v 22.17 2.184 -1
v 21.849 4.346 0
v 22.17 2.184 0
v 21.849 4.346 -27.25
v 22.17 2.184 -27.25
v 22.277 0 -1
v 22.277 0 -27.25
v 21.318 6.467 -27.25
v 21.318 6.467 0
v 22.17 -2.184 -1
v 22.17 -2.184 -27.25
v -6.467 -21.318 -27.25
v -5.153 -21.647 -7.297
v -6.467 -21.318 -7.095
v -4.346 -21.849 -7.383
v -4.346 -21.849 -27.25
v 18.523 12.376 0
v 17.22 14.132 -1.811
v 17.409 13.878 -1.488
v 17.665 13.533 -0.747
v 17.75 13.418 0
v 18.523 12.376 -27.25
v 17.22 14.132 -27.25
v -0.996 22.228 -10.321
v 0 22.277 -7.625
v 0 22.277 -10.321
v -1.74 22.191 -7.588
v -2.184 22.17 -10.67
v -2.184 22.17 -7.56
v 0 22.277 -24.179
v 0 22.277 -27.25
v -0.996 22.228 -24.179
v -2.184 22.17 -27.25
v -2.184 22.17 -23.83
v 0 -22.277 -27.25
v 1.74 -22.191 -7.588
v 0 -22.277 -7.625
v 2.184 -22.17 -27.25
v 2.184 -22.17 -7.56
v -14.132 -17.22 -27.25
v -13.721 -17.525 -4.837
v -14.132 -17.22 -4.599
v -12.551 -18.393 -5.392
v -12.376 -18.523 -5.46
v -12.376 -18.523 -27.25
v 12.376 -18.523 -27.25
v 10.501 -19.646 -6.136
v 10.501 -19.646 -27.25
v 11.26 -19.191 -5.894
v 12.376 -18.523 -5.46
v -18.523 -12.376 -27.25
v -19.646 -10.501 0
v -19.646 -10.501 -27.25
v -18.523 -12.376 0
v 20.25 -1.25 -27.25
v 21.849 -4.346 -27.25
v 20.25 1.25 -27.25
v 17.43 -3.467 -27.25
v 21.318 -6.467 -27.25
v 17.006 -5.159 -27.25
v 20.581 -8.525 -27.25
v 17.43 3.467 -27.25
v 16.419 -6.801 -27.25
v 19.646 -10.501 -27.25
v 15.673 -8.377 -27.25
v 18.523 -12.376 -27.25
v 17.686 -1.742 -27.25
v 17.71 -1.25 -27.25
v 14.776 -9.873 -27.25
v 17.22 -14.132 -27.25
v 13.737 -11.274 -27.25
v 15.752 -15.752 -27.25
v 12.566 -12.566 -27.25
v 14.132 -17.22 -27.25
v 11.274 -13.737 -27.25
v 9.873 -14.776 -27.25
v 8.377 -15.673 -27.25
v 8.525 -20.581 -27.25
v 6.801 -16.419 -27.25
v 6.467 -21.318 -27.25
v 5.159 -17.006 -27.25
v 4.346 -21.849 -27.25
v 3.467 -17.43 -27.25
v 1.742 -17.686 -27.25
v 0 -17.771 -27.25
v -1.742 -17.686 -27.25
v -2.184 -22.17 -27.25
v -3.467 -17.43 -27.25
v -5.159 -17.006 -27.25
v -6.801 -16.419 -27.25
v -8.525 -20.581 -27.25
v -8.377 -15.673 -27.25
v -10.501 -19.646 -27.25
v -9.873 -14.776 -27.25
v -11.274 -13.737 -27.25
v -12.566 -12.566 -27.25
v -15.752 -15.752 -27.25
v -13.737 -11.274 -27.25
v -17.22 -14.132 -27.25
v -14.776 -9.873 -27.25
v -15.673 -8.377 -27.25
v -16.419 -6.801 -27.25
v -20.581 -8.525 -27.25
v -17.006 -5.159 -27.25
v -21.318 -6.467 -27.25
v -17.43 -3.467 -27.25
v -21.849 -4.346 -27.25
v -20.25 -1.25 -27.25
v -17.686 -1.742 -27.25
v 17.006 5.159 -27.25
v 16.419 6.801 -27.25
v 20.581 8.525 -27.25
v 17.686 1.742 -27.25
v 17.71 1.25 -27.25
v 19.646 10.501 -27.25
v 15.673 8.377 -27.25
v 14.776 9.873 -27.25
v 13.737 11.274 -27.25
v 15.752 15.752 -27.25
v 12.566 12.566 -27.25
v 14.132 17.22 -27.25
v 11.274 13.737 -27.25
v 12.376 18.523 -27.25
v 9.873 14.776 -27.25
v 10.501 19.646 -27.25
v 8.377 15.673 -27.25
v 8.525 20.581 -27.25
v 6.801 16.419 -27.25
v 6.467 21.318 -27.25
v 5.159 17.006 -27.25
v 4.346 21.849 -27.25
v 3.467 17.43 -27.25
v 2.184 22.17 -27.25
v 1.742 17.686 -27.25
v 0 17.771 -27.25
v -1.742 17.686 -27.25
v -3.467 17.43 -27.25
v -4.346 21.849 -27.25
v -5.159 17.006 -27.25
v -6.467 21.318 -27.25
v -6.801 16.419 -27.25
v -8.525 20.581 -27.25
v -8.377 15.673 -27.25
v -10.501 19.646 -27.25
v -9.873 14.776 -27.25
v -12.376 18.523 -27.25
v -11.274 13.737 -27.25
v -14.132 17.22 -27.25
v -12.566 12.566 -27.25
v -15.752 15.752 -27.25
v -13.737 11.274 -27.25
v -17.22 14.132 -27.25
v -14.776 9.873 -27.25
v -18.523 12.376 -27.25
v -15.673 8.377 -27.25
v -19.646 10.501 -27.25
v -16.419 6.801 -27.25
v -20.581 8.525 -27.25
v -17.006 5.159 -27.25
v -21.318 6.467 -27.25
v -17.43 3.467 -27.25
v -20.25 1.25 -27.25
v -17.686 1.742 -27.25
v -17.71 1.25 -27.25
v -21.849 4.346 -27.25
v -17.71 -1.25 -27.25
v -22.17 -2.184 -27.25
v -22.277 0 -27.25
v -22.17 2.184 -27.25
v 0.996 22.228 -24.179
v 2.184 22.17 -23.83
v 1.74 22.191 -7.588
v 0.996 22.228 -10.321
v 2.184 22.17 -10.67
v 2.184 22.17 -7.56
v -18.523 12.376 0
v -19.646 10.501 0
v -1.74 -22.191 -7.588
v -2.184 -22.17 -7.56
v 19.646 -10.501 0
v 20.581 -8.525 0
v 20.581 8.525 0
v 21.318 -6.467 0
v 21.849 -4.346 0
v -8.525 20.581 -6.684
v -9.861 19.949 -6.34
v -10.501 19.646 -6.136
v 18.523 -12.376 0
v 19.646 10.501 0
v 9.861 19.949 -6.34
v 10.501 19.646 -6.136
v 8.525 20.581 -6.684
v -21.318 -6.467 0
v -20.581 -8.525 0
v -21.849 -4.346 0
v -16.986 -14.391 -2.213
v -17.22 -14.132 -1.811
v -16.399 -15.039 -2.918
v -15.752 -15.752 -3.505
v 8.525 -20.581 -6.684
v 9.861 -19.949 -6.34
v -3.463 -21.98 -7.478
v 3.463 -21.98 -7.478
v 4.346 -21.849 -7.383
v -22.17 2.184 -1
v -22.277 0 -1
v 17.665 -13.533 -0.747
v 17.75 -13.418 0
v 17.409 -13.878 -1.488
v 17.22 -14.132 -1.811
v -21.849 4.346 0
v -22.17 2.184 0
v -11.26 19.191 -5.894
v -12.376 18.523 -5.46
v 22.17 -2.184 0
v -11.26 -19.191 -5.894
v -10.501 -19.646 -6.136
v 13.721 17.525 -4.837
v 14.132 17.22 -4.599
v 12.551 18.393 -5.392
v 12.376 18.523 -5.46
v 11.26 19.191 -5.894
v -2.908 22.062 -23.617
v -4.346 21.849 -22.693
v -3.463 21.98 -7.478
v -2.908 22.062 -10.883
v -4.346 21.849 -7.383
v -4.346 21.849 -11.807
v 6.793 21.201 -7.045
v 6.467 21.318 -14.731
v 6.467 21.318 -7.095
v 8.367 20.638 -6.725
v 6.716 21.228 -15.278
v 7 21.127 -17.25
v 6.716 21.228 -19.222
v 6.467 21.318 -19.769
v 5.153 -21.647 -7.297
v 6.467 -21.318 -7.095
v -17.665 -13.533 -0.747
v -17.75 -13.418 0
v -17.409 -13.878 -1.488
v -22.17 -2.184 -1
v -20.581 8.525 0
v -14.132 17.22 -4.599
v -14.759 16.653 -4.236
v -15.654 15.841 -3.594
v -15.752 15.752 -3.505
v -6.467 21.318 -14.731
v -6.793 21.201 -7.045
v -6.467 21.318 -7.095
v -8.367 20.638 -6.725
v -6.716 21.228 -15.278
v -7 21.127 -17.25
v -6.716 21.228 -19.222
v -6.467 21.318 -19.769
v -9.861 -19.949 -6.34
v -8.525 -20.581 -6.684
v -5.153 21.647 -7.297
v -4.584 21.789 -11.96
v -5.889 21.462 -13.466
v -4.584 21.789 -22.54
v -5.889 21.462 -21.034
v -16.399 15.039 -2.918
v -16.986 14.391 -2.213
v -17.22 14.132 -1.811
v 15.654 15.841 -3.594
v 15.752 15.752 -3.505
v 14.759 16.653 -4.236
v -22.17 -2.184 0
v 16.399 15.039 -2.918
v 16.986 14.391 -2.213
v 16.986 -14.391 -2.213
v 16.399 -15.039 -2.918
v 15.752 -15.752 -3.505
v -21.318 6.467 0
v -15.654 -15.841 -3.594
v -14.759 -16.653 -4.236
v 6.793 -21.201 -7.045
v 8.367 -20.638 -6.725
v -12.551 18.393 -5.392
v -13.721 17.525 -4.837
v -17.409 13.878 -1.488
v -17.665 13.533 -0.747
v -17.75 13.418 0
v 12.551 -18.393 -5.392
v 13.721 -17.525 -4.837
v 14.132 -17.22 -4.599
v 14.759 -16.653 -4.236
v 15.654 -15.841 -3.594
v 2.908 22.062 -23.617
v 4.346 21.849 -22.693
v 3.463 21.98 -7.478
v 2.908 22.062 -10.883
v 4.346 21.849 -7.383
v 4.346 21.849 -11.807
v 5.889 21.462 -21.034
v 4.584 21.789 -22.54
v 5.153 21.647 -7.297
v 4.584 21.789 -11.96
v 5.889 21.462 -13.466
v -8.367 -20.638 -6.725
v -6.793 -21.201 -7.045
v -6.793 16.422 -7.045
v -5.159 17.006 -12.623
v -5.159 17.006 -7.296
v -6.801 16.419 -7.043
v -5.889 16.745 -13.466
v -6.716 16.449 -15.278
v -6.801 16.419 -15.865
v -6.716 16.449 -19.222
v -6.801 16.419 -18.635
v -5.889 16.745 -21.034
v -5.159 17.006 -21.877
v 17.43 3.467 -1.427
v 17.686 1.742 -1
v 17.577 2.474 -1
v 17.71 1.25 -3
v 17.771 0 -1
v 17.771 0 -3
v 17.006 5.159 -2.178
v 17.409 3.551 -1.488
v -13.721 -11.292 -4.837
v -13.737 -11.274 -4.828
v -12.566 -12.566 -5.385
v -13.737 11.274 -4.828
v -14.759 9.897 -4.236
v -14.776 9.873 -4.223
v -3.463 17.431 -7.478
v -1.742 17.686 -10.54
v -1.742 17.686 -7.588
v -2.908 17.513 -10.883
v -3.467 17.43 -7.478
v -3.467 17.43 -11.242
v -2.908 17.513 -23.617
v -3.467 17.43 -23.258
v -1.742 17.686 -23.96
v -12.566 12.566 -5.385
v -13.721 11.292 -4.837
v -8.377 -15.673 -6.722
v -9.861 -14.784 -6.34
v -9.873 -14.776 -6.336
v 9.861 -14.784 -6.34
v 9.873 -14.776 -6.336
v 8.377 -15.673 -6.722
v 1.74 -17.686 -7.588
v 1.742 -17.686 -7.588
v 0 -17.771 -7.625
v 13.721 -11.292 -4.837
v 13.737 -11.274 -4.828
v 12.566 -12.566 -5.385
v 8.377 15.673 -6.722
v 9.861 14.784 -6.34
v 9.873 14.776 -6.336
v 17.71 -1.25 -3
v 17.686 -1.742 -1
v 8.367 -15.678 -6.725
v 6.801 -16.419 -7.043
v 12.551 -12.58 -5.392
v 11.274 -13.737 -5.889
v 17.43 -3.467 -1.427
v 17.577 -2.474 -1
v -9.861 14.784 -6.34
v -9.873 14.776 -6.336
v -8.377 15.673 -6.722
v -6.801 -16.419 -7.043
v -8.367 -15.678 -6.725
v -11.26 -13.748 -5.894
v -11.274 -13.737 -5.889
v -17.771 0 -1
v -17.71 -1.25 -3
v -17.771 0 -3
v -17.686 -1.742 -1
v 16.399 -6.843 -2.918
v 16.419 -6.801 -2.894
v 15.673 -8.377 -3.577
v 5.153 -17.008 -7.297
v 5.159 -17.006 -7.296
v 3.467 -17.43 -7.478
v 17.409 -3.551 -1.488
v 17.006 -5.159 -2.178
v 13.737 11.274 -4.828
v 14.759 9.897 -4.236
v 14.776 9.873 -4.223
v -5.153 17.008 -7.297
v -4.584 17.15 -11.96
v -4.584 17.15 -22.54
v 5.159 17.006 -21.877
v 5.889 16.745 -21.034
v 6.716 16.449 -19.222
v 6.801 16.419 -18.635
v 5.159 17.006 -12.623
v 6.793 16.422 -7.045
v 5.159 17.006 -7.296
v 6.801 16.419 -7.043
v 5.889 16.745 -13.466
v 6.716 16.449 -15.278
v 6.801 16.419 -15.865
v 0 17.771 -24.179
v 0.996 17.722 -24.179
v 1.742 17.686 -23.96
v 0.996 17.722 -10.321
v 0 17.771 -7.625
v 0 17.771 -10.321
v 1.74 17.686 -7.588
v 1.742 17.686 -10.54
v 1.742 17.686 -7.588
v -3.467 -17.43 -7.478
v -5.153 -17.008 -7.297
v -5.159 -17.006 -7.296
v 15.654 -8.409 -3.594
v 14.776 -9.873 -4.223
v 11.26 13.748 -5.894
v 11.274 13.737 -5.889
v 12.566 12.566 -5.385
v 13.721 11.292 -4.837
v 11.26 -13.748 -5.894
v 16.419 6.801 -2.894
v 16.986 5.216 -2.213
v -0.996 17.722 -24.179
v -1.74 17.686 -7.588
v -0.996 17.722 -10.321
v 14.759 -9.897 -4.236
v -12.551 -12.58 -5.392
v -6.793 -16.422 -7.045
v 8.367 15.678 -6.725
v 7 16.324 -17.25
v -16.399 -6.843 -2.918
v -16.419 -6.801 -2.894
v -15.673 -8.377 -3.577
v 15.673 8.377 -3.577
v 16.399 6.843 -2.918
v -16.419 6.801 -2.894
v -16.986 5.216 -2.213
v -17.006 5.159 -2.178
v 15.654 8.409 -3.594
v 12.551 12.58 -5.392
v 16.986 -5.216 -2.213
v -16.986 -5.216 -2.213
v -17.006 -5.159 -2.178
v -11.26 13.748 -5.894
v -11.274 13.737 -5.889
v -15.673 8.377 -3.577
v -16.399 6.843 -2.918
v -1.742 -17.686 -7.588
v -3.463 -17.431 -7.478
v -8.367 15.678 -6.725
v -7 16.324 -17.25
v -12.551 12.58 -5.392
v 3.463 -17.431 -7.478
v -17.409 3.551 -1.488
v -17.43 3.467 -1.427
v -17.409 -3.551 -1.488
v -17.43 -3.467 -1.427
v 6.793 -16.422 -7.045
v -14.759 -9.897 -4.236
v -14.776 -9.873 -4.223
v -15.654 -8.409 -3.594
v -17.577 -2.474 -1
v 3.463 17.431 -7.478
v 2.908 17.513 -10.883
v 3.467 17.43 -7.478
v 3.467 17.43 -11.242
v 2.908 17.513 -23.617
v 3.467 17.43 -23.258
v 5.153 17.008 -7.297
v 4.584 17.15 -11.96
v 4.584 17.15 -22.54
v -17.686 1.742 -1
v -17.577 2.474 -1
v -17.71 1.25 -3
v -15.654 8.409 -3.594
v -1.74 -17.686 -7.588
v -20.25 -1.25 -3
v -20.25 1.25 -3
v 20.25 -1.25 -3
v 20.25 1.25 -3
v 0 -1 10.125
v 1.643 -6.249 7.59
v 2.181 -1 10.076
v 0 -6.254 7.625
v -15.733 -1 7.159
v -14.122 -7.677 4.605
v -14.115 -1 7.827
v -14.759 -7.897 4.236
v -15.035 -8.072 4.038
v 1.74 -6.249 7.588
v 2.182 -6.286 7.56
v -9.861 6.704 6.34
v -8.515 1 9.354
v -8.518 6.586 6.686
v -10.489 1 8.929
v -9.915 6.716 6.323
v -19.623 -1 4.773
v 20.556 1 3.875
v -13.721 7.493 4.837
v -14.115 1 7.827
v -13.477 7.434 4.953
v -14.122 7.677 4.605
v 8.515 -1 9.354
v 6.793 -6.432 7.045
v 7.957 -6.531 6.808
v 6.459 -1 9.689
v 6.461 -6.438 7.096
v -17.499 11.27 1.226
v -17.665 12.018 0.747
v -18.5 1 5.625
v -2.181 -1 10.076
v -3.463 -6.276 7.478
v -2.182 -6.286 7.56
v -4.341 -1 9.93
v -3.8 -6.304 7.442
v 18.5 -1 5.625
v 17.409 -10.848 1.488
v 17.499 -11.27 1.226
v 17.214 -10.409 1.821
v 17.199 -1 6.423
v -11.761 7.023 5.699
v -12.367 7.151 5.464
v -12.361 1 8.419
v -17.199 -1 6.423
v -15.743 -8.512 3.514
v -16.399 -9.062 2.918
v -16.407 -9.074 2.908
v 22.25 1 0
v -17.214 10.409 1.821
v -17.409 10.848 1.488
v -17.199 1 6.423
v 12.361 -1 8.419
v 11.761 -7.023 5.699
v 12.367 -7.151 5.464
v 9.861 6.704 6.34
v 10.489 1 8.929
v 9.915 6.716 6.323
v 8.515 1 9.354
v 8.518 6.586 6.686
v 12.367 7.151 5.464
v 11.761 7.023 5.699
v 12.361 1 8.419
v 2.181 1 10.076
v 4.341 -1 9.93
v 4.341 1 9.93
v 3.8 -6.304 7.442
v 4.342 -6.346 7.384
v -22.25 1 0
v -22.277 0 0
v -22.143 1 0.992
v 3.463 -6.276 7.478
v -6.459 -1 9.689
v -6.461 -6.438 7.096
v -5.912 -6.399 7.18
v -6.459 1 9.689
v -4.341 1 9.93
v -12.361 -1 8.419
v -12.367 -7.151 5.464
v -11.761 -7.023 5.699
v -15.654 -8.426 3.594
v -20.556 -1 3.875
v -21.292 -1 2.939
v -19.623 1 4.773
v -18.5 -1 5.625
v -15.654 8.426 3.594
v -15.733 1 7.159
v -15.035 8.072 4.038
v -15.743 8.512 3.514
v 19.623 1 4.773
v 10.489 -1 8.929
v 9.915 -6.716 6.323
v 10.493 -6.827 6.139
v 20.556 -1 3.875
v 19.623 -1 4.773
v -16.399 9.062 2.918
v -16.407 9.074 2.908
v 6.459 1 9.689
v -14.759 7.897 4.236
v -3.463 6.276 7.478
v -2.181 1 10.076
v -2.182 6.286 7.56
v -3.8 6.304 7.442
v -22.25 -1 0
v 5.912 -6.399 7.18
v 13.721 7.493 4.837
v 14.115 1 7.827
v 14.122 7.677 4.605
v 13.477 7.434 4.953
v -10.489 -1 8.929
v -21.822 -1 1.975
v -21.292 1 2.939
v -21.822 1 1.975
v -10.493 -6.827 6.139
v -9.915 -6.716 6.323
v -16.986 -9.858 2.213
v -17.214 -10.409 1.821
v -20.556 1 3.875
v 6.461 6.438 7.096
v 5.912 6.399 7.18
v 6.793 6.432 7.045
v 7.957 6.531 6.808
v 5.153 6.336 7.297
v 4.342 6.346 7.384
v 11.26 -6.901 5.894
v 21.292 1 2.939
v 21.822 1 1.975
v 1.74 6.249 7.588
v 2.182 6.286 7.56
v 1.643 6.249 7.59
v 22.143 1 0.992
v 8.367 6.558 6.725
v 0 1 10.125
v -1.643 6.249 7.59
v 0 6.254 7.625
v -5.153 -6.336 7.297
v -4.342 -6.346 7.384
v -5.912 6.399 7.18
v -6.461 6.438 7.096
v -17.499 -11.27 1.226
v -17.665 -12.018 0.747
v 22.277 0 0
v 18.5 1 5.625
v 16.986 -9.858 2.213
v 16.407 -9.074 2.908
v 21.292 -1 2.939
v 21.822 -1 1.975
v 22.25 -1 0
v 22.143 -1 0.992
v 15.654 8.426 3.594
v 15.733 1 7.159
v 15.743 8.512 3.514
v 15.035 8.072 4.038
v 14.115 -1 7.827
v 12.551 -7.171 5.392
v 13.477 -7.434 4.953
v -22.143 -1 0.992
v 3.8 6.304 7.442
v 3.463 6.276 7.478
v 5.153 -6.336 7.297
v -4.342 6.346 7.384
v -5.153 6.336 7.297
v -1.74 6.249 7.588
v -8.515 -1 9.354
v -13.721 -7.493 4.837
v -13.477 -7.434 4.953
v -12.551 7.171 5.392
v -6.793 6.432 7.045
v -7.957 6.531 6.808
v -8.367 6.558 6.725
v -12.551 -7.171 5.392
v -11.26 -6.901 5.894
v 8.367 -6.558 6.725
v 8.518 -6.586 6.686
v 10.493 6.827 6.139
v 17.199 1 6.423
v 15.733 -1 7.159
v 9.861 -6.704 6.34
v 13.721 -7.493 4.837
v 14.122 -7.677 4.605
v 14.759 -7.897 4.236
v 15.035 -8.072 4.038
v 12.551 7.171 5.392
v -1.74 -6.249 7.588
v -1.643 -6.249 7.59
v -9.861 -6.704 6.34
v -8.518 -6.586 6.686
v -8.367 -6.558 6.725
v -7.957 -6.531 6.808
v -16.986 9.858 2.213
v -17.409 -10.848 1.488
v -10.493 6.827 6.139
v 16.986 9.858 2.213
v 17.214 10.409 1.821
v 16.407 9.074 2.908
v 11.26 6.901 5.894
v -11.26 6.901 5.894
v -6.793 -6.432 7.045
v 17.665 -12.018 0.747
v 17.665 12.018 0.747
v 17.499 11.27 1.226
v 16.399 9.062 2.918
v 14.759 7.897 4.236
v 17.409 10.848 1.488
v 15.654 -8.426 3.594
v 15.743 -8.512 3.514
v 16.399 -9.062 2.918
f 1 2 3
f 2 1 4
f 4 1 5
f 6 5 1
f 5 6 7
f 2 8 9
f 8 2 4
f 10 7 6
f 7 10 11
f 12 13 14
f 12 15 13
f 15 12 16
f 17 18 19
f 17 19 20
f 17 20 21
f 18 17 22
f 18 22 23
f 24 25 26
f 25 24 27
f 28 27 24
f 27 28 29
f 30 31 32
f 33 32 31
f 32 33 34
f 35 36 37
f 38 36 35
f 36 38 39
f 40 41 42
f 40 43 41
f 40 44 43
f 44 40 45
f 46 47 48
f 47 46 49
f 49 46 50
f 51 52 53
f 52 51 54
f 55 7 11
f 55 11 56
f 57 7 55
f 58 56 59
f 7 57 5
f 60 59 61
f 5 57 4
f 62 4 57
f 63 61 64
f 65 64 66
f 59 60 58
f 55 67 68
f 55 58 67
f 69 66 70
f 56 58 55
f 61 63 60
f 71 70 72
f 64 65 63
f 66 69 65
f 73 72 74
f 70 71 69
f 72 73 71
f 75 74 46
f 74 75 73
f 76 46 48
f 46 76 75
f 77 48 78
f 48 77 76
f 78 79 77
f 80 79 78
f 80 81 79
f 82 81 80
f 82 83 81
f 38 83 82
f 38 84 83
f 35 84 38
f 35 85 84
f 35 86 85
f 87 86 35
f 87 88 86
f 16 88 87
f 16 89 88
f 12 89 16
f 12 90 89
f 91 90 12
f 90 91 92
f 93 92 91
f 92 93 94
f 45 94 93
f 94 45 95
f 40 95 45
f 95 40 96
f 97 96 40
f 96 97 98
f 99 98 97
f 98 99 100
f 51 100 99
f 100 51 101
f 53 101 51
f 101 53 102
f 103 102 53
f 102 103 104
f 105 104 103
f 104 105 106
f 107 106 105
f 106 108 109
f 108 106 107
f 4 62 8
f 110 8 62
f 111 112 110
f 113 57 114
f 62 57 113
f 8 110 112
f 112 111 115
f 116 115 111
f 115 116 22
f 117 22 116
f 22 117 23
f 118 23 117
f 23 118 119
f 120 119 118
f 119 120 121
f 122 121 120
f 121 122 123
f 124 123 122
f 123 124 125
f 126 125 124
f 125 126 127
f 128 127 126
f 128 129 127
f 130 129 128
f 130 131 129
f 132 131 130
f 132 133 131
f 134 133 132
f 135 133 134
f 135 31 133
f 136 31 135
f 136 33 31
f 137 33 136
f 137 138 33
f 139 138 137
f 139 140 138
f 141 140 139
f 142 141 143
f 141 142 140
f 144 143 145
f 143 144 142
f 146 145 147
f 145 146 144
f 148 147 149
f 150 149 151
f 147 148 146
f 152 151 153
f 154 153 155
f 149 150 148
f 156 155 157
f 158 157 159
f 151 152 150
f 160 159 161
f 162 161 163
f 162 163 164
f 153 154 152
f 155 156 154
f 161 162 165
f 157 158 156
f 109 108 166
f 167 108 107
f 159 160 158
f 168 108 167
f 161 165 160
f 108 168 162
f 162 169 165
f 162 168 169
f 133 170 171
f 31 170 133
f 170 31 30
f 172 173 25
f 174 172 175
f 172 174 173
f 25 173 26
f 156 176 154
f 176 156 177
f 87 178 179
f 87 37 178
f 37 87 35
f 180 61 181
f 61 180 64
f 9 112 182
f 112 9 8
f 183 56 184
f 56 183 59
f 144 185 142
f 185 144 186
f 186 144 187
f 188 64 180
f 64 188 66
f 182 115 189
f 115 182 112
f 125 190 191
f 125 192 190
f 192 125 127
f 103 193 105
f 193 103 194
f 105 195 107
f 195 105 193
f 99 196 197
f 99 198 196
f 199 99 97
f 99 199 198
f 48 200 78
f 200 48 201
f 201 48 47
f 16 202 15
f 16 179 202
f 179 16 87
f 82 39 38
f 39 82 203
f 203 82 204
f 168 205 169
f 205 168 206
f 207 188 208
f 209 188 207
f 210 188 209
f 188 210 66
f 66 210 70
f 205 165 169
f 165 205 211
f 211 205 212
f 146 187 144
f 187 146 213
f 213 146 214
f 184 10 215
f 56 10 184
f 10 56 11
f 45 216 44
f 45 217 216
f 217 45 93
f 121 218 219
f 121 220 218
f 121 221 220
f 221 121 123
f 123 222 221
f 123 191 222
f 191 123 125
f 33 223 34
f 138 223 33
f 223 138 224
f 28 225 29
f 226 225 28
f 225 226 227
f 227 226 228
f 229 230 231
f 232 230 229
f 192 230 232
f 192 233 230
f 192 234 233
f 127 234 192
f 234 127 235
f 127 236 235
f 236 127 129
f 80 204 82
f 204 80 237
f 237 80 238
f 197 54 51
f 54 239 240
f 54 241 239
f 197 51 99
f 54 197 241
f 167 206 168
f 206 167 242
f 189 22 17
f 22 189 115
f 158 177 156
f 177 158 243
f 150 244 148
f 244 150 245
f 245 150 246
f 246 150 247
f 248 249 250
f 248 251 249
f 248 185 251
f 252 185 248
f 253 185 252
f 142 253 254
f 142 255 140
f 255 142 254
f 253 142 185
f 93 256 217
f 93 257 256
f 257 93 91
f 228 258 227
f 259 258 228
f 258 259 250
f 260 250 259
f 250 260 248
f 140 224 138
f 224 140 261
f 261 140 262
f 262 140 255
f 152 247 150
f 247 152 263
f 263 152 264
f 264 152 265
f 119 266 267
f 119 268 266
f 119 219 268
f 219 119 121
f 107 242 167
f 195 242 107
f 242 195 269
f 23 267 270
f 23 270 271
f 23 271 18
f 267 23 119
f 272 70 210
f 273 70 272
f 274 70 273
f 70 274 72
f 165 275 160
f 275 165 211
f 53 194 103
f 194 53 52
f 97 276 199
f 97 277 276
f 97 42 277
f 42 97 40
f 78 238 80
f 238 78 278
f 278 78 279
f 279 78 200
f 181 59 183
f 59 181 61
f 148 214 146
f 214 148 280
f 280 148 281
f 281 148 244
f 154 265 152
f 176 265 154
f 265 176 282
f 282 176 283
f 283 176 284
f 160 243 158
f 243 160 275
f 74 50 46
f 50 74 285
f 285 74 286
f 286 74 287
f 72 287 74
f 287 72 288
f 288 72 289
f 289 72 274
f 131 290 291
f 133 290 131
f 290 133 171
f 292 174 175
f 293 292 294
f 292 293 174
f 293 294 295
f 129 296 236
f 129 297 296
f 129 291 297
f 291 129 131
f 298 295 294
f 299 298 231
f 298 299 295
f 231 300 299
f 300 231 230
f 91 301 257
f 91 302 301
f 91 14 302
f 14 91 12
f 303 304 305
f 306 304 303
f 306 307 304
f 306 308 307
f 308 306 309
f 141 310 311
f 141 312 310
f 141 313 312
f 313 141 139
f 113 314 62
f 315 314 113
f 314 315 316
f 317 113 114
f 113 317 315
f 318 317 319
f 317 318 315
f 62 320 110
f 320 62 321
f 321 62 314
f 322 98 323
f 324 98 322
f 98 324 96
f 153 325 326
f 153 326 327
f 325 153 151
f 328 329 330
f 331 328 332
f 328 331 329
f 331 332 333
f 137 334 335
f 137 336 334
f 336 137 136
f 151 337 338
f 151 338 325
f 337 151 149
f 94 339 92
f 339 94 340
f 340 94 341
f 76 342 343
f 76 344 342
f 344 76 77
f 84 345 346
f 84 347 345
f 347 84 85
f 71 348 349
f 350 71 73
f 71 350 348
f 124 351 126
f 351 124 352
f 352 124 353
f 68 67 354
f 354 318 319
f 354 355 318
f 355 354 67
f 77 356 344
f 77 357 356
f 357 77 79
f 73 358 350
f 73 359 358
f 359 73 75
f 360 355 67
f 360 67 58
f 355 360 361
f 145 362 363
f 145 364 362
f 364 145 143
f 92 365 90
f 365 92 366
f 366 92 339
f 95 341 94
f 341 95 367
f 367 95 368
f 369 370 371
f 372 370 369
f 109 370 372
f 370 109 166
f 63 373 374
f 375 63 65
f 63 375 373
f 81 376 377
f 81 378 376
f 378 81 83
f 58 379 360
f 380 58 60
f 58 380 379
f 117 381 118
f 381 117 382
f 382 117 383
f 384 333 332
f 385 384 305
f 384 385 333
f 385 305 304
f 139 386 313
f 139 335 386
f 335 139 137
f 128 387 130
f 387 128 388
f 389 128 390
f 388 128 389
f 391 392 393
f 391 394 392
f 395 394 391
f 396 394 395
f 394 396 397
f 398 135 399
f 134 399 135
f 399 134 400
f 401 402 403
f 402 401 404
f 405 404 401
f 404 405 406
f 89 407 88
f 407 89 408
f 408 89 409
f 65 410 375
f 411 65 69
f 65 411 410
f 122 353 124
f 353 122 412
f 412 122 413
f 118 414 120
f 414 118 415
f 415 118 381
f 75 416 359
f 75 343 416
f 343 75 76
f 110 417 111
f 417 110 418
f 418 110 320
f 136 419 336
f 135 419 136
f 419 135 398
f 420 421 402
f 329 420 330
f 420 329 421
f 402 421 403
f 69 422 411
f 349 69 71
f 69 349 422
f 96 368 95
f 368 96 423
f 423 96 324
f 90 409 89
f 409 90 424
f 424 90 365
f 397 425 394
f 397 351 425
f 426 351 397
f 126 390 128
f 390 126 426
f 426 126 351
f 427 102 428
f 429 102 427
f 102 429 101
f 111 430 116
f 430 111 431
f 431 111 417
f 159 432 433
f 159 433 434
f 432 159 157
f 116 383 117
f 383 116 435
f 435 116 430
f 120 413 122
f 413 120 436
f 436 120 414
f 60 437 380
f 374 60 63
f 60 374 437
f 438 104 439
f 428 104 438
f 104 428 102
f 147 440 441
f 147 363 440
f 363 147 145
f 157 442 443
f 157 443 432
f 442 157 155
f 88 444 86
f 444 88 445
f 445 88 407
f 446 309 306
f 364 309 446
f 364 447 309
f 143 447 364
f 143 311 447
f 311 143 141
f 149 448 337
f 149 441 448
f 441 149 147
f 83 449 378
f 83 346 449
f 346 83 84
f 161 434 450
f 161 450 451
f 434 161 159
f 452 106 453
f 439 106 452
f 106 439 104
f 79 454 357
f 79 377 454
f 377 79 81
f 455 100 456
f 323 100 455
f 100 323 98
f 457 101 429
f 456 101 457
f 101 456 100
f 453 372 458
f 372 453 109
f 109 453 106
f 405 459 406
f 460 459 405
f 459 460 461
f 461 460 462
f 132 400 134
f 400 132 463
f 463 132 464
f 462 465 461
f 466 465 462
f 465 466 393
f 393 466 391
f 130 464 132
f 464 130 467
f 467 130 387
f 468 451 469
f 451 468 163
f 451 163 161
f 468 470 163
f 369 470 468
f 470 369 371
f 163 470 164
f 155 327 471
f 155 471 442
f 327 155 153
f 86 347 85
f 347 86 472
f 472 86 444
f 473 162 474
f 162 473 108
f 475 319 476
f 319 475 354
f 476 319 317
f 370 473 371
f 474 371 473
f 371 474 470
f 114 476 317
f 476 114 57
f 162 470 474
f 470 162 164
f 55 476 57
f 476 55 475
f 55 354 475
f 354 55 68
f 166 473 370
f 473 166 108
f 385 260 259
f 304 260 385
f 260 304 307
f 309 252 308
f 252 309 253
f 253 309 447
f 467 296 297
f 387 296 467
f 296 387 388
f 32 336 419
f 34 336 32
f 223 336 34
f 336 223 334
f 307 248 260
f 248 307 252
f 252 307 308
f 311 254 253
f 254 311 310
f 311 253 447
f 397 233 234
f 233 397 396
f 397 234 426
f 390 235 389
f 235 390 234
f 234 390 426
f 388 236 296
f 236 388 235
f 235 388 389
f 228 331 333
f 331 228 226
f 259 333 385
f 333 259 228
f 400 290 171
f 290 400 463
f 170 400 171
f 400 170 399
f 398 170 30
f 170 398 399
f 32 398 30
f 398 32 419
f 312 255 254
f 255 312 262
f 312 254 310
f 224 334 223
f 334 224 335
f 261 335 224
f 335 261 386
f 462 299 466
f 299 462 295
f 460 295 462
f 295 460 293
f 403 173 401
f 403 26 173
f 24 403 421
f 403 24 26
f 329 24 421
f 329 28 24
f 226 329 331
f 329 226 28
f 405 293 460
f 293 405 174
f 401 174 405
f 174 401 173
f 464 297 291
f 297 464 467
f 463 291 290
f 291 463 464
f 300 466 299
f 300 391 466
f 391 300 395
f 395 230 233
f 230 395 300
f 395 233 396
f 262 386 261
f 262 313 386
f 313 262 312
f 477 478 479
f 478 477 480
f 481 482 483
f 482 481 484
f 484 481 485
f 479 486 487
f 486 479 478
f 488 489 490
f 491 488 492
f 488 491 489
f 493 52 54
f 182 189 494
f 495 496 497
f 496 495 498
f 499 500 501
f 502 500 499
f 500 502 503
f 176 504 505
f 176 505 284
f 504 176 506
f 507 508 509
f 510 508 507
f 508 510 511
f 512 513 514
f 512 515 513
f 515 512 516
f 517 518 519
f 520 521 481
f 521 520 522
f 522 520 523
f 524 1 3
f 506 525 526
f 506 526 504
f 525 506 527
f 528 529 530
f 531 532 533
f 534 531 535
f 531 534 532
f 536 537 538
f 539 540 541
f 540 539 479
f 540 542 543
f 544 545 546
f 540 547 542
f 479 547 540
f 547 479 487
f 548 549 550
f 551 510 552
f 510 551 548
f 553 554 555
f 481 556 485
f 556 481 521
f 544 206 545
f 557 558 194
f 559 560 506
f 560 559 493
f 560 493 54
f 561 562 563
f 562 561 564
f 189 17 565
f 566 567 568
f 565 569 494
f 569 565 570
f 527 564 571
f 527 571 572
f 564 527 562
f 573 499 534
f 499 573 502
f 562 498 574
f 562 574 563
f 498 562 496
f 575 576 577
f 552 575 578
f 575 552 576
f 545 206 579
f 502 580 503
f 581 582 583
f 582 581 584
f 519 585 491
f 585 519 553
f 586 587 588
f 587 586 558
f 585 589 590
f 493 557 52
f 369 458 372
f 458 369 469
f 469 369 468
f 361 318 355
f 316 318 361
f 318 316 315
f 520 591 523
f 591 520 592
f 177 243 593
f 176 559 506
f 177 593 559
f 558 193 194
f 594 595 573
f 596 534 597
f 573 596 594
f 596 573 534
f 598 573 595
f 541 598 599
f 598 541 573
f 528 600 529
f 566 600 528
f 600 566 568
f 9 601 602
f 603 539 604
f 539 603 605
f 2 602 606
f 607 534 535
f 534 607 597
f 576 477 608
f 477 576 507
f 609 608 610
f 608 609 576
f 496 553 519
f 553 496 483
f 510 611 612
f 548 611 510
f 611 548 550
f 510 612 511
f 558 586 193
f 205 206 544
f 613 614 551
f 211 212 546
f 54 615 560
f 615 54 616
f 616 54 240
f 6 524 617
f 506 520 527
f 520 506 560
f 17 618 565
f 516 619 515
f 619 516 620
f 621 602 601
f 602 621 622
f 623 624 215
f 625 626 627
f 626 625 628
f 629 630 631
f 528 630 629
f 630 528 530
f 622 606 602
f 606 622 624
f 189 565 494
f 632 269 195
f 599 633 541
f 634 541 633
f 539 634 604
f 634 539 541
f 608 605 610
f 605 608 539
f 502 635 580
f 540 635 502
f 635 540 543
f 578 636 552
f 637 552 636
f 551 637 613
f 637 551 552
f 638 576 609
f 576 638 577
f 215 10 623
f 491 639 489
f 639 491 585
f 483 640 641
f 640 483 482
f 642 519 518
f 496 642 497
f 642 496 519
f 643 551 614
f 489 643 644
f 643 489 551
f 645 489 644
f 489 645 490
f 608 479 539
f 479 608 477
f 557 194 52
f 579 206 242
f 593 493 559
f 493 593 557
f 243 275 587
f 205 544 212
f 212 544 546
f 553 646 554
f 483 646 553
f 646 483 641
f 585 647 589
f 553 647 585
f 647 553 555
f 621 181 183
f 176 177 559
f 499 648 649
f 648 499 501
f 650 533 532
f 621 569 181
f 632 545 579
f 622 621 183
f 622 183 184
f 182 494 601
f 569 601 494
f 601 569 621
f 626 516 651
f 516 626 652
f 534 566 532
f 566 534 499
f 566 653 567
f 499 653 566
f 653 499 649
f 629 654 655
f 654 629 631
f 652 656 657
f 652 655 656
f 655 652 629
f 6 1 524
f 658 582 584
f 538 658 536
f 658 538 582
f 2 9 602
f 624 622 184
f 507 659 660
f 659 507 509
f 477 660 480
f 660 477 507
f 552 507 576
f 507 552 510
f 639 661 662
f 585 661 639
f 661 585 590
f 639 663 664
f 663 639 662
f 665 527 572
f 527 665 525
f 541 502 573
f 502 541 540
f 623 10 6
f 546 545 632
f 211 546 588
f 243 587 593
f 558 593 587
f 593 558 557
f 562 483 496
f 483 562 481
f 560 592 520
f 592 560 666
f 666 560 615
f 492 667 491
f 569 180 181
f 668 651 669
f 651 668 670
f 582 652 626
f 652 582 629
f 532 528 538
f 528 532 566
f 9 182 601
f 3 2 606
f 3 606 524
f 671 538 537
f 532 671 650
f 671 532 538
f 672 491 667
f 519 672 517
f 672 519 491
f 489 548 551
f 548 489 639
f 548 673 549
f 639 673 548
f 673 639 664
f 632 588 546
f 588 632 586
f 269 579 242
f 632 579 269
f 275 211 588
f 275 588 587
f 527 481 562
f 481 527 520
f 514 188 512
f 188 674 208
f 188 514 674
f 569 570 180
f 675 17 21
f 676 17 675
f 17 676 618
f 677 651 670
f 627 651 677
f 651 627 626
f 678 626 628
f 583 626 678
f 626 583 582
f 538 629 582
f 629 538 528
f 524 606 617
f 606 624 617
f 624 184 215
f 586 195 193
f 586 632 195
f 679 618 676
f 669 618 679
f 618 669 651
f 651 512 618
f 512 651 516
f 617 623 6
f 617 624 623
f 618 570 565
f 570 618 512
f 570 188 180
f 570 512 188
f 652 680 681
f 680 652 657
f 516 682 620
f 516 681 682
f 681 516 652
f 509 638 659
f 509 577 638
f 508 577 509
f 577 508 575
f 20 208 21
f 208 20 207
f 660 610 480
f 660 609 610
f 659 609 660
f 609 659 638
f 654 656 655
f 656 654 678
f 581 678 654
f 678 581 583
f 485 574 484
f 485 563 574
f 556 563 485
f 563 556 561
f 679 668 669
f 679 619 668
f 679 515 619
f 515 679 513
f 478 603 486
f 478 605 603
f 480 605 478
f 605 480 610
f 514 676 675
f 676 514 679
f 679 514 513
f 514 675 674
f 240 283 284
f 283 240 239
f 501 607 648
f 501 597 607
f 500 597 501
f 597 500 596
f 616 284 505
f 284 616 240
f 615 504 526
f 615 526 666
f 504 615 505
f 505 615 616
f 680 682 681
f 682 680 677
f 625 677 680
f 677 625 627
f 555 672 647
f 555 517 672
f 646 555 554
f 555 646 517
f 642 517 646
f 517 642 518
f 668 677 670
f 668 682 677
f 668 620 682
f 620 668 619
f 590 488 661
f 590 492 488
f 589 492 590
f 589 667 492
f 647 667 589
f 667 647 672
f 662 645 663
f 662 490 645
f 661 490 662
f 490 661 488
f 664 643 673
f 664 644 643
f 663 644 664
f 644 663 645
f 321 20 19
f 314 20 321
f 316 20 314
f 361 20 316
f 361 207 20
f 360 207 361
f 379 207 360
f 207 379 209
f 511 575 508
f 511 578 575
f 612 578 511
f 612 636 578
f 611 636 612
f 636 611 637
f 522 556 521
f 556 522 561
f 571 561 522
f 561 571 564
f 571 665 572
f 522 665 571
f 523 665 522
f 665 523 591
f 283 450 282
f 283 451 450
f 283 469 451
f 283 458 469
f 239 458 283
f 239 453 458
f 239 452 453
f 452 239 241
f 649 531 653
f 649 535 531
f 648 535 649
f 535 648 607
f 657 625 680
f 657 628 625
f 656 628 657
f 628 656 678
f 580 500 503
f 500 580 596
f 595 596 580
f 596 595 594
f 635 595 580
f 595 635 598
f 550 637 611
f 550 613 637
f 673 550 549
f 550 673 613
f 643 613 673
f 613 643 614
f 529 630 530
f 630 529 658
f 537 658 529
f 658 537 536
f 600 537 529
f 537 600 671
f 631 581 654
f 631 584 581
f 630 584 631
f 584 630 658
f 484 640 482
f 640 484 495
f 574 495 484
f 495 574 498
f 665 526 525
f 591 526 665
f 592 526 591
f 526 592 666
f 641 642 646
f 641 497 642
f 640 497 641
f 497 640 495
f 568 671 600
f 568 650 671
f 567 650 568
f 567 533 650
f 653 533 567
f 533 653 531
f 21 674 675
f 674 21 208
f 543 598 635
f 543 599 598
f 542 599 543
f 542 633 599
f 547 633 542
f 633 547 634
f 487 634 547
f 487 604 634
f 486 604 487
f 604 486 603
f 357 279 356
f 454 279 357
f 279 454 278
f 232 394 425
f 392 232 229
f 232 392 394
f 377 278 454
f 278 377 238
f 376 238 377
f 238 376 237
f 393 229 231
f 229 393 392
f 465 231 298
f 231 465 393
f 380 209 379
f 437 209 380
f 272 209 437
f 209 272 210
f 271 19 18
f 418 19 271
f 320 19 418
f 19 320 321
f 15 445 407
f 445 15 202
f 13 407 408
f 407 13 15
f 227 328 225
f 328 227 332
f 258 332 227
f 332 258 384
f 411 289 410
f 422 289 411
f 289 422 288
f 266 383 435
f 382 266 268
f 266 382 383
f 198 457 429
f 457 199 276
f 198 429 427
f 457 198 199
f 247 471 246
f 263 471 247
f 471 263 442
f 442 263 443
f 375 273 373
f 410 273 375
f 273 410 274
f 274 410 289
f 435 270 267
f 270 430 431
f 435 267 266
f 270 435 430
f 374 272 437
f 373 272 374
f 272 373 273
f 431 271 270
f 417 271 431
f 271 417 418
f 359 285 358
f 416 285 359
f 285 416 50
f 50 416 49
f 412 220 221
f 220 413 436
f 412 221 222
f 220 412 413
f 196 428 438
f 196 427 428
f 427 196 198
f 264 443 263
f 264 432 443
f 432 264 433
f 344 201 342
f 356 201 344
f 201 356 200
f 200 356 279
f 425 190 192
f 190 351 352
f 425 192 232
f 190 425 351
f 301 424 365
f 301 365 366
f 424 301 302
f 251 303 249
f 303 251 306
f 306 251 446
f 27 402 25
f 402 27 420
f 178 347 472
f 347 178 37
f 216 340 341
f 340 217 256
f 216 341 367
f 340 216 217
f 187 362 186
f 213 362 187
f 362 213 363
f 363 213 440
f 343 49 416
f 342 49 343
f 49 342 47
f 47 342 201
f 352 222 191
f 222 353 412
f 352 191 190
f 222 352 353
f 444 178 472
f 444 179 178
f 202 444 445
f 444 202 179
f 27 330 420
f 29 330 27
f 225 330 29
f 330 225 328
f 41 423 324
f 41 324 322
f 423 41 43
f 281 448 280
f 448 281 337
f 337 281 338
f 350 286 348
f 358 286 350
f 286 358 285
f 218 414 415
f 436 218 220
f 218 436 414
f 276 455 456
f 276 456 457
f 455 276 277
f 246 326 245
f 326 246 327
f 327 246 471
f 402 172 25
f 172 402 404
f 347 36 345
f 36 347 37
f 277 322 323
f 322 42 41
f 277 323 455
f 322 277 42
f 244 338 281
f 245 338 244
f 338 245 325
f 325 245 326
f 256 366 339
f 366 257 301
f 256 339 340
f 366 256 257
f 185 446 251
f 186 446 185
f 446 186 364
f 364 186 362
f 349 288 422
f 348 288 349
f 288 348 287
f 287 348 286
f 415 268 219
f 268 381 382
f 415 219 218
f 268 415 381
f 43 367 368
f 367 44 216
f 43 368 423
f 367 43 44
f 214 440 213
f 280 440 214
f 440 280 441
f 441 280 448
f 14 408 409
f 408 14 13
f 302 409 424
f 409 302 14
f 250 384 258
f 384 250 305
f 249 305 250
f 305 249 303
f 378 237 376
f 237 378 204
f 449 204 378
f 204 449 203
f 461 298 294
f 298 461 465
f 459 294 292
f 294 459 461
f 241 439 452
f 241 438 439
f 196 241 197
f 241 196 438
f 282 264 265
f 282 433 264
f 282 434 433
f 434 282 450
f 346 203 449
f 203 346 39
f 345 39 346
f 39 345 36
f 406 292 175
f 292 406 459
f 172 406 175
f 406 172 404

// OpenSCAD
module cylinder_outer(height,radius,fn) {
   fudge = 1/cos(180/fn);
   cylinder(h=height,r=radius*fudge,$fn=fn);
}

VACUUM_DIAM_WITH_SLOTS = 40.5;
VACUUM_DIAM=35.5;
LIP_DEPTH=3;
VACUUM_DEPTH=24.25 + LIP_DEPTH;
SLOT_WIDTH=2.5;
BUTTON_DIAM=14;
SLOT_RECESS=3;


SCALE_ELLIPSE = VACUUM_DIAM / (VACUUM_DEPTH - (LIP_DEPTH * 4));
SCALE_ELLIPSE_BIG = (VACUUM_DIAM_WITH_SLOTS + 4) / (VACUUM_DEPTH - (LIP_DEPTH * 4) + (VACUUM_DIAM_WITH_SLOTS - VACUUM_DIAM));

module arch() {
    intersection() {
        rotate([90, 0, 0]) linear_extrude(height=100, center=true) scale([  SCALE_ELLIPSE_BIG, 1, 1]) circle(d=VACUUM_DEPTH - (LIP_DEPTH * 4) + (VACUUM_DIAM_WITH_SLOTS - VACUUM_DIAM), $fn=64);
        translate([0, 1, (VACUUM_DIAM_WITH_SLOTS + 4) * 0.5]) rotate([90, 0, 0]) linear_extrude(height=2) square([VACUUM_DIAM_WITH_SLOTS + 4, VACUUM_DIAM_WITH_SLOTS + 4], center=true);                 
    }
}

module bottom() {
    translate([0, 0, -1 * VACUUM_DEPTH]) {
        difference() {
            difference() {
                difference() {   
                    cylinder_outer(VACUUM_DEPTH, (VACUUM_DIAM_WITH_SLOTS + 4) / 2, 64);
                    cylinder_outer(VACUUM_DEPTH, VACUUM_DIAM / 2, 64);
                }
                linear_extrude(height=VACUUM_DEPTH - SLOT_RECESS) {
                    square([VACUUM_DIAM_WITH_SLOTS, SLOT_WIDTH], center=true);
              };
            }
            translate([0, 0, (BUTTON_DIAM/2) + LIP_DEPTH]) rotate([-90, 0, 0]) cylinder(d=BUTTON_DIAM, h=30);
        }
    }
}

// slice top of bottom
module hook() {
    difference() {
        hull() {
            intersection() {
                bottom();
                translate([0, 0, -1]) cylinder_outer(1, (VACUUM_DIAM_WITH_SLOTS + 4) / 2, 64);
            }
            arch();
        }
        rotate([90, 0, 0]) linear_extrude(height=100, center=true) scale([SCALE_ELLIPSE, 1, 1]) circle(d=VACUUM_DEPTH - (LIP_DEPTH * 4), $fn=64);
    }
}

difference() {
    union() {
        bottom();
        hook();
    }
    rotate([90, 0, 0]) linear_extrude(height=100, center=true) scale([SCALE_ELLIPSE, 1, 1]) circle(d=VACUUM_DEPTH - (LIP_DEPTH * 4), $fn=64);
}
